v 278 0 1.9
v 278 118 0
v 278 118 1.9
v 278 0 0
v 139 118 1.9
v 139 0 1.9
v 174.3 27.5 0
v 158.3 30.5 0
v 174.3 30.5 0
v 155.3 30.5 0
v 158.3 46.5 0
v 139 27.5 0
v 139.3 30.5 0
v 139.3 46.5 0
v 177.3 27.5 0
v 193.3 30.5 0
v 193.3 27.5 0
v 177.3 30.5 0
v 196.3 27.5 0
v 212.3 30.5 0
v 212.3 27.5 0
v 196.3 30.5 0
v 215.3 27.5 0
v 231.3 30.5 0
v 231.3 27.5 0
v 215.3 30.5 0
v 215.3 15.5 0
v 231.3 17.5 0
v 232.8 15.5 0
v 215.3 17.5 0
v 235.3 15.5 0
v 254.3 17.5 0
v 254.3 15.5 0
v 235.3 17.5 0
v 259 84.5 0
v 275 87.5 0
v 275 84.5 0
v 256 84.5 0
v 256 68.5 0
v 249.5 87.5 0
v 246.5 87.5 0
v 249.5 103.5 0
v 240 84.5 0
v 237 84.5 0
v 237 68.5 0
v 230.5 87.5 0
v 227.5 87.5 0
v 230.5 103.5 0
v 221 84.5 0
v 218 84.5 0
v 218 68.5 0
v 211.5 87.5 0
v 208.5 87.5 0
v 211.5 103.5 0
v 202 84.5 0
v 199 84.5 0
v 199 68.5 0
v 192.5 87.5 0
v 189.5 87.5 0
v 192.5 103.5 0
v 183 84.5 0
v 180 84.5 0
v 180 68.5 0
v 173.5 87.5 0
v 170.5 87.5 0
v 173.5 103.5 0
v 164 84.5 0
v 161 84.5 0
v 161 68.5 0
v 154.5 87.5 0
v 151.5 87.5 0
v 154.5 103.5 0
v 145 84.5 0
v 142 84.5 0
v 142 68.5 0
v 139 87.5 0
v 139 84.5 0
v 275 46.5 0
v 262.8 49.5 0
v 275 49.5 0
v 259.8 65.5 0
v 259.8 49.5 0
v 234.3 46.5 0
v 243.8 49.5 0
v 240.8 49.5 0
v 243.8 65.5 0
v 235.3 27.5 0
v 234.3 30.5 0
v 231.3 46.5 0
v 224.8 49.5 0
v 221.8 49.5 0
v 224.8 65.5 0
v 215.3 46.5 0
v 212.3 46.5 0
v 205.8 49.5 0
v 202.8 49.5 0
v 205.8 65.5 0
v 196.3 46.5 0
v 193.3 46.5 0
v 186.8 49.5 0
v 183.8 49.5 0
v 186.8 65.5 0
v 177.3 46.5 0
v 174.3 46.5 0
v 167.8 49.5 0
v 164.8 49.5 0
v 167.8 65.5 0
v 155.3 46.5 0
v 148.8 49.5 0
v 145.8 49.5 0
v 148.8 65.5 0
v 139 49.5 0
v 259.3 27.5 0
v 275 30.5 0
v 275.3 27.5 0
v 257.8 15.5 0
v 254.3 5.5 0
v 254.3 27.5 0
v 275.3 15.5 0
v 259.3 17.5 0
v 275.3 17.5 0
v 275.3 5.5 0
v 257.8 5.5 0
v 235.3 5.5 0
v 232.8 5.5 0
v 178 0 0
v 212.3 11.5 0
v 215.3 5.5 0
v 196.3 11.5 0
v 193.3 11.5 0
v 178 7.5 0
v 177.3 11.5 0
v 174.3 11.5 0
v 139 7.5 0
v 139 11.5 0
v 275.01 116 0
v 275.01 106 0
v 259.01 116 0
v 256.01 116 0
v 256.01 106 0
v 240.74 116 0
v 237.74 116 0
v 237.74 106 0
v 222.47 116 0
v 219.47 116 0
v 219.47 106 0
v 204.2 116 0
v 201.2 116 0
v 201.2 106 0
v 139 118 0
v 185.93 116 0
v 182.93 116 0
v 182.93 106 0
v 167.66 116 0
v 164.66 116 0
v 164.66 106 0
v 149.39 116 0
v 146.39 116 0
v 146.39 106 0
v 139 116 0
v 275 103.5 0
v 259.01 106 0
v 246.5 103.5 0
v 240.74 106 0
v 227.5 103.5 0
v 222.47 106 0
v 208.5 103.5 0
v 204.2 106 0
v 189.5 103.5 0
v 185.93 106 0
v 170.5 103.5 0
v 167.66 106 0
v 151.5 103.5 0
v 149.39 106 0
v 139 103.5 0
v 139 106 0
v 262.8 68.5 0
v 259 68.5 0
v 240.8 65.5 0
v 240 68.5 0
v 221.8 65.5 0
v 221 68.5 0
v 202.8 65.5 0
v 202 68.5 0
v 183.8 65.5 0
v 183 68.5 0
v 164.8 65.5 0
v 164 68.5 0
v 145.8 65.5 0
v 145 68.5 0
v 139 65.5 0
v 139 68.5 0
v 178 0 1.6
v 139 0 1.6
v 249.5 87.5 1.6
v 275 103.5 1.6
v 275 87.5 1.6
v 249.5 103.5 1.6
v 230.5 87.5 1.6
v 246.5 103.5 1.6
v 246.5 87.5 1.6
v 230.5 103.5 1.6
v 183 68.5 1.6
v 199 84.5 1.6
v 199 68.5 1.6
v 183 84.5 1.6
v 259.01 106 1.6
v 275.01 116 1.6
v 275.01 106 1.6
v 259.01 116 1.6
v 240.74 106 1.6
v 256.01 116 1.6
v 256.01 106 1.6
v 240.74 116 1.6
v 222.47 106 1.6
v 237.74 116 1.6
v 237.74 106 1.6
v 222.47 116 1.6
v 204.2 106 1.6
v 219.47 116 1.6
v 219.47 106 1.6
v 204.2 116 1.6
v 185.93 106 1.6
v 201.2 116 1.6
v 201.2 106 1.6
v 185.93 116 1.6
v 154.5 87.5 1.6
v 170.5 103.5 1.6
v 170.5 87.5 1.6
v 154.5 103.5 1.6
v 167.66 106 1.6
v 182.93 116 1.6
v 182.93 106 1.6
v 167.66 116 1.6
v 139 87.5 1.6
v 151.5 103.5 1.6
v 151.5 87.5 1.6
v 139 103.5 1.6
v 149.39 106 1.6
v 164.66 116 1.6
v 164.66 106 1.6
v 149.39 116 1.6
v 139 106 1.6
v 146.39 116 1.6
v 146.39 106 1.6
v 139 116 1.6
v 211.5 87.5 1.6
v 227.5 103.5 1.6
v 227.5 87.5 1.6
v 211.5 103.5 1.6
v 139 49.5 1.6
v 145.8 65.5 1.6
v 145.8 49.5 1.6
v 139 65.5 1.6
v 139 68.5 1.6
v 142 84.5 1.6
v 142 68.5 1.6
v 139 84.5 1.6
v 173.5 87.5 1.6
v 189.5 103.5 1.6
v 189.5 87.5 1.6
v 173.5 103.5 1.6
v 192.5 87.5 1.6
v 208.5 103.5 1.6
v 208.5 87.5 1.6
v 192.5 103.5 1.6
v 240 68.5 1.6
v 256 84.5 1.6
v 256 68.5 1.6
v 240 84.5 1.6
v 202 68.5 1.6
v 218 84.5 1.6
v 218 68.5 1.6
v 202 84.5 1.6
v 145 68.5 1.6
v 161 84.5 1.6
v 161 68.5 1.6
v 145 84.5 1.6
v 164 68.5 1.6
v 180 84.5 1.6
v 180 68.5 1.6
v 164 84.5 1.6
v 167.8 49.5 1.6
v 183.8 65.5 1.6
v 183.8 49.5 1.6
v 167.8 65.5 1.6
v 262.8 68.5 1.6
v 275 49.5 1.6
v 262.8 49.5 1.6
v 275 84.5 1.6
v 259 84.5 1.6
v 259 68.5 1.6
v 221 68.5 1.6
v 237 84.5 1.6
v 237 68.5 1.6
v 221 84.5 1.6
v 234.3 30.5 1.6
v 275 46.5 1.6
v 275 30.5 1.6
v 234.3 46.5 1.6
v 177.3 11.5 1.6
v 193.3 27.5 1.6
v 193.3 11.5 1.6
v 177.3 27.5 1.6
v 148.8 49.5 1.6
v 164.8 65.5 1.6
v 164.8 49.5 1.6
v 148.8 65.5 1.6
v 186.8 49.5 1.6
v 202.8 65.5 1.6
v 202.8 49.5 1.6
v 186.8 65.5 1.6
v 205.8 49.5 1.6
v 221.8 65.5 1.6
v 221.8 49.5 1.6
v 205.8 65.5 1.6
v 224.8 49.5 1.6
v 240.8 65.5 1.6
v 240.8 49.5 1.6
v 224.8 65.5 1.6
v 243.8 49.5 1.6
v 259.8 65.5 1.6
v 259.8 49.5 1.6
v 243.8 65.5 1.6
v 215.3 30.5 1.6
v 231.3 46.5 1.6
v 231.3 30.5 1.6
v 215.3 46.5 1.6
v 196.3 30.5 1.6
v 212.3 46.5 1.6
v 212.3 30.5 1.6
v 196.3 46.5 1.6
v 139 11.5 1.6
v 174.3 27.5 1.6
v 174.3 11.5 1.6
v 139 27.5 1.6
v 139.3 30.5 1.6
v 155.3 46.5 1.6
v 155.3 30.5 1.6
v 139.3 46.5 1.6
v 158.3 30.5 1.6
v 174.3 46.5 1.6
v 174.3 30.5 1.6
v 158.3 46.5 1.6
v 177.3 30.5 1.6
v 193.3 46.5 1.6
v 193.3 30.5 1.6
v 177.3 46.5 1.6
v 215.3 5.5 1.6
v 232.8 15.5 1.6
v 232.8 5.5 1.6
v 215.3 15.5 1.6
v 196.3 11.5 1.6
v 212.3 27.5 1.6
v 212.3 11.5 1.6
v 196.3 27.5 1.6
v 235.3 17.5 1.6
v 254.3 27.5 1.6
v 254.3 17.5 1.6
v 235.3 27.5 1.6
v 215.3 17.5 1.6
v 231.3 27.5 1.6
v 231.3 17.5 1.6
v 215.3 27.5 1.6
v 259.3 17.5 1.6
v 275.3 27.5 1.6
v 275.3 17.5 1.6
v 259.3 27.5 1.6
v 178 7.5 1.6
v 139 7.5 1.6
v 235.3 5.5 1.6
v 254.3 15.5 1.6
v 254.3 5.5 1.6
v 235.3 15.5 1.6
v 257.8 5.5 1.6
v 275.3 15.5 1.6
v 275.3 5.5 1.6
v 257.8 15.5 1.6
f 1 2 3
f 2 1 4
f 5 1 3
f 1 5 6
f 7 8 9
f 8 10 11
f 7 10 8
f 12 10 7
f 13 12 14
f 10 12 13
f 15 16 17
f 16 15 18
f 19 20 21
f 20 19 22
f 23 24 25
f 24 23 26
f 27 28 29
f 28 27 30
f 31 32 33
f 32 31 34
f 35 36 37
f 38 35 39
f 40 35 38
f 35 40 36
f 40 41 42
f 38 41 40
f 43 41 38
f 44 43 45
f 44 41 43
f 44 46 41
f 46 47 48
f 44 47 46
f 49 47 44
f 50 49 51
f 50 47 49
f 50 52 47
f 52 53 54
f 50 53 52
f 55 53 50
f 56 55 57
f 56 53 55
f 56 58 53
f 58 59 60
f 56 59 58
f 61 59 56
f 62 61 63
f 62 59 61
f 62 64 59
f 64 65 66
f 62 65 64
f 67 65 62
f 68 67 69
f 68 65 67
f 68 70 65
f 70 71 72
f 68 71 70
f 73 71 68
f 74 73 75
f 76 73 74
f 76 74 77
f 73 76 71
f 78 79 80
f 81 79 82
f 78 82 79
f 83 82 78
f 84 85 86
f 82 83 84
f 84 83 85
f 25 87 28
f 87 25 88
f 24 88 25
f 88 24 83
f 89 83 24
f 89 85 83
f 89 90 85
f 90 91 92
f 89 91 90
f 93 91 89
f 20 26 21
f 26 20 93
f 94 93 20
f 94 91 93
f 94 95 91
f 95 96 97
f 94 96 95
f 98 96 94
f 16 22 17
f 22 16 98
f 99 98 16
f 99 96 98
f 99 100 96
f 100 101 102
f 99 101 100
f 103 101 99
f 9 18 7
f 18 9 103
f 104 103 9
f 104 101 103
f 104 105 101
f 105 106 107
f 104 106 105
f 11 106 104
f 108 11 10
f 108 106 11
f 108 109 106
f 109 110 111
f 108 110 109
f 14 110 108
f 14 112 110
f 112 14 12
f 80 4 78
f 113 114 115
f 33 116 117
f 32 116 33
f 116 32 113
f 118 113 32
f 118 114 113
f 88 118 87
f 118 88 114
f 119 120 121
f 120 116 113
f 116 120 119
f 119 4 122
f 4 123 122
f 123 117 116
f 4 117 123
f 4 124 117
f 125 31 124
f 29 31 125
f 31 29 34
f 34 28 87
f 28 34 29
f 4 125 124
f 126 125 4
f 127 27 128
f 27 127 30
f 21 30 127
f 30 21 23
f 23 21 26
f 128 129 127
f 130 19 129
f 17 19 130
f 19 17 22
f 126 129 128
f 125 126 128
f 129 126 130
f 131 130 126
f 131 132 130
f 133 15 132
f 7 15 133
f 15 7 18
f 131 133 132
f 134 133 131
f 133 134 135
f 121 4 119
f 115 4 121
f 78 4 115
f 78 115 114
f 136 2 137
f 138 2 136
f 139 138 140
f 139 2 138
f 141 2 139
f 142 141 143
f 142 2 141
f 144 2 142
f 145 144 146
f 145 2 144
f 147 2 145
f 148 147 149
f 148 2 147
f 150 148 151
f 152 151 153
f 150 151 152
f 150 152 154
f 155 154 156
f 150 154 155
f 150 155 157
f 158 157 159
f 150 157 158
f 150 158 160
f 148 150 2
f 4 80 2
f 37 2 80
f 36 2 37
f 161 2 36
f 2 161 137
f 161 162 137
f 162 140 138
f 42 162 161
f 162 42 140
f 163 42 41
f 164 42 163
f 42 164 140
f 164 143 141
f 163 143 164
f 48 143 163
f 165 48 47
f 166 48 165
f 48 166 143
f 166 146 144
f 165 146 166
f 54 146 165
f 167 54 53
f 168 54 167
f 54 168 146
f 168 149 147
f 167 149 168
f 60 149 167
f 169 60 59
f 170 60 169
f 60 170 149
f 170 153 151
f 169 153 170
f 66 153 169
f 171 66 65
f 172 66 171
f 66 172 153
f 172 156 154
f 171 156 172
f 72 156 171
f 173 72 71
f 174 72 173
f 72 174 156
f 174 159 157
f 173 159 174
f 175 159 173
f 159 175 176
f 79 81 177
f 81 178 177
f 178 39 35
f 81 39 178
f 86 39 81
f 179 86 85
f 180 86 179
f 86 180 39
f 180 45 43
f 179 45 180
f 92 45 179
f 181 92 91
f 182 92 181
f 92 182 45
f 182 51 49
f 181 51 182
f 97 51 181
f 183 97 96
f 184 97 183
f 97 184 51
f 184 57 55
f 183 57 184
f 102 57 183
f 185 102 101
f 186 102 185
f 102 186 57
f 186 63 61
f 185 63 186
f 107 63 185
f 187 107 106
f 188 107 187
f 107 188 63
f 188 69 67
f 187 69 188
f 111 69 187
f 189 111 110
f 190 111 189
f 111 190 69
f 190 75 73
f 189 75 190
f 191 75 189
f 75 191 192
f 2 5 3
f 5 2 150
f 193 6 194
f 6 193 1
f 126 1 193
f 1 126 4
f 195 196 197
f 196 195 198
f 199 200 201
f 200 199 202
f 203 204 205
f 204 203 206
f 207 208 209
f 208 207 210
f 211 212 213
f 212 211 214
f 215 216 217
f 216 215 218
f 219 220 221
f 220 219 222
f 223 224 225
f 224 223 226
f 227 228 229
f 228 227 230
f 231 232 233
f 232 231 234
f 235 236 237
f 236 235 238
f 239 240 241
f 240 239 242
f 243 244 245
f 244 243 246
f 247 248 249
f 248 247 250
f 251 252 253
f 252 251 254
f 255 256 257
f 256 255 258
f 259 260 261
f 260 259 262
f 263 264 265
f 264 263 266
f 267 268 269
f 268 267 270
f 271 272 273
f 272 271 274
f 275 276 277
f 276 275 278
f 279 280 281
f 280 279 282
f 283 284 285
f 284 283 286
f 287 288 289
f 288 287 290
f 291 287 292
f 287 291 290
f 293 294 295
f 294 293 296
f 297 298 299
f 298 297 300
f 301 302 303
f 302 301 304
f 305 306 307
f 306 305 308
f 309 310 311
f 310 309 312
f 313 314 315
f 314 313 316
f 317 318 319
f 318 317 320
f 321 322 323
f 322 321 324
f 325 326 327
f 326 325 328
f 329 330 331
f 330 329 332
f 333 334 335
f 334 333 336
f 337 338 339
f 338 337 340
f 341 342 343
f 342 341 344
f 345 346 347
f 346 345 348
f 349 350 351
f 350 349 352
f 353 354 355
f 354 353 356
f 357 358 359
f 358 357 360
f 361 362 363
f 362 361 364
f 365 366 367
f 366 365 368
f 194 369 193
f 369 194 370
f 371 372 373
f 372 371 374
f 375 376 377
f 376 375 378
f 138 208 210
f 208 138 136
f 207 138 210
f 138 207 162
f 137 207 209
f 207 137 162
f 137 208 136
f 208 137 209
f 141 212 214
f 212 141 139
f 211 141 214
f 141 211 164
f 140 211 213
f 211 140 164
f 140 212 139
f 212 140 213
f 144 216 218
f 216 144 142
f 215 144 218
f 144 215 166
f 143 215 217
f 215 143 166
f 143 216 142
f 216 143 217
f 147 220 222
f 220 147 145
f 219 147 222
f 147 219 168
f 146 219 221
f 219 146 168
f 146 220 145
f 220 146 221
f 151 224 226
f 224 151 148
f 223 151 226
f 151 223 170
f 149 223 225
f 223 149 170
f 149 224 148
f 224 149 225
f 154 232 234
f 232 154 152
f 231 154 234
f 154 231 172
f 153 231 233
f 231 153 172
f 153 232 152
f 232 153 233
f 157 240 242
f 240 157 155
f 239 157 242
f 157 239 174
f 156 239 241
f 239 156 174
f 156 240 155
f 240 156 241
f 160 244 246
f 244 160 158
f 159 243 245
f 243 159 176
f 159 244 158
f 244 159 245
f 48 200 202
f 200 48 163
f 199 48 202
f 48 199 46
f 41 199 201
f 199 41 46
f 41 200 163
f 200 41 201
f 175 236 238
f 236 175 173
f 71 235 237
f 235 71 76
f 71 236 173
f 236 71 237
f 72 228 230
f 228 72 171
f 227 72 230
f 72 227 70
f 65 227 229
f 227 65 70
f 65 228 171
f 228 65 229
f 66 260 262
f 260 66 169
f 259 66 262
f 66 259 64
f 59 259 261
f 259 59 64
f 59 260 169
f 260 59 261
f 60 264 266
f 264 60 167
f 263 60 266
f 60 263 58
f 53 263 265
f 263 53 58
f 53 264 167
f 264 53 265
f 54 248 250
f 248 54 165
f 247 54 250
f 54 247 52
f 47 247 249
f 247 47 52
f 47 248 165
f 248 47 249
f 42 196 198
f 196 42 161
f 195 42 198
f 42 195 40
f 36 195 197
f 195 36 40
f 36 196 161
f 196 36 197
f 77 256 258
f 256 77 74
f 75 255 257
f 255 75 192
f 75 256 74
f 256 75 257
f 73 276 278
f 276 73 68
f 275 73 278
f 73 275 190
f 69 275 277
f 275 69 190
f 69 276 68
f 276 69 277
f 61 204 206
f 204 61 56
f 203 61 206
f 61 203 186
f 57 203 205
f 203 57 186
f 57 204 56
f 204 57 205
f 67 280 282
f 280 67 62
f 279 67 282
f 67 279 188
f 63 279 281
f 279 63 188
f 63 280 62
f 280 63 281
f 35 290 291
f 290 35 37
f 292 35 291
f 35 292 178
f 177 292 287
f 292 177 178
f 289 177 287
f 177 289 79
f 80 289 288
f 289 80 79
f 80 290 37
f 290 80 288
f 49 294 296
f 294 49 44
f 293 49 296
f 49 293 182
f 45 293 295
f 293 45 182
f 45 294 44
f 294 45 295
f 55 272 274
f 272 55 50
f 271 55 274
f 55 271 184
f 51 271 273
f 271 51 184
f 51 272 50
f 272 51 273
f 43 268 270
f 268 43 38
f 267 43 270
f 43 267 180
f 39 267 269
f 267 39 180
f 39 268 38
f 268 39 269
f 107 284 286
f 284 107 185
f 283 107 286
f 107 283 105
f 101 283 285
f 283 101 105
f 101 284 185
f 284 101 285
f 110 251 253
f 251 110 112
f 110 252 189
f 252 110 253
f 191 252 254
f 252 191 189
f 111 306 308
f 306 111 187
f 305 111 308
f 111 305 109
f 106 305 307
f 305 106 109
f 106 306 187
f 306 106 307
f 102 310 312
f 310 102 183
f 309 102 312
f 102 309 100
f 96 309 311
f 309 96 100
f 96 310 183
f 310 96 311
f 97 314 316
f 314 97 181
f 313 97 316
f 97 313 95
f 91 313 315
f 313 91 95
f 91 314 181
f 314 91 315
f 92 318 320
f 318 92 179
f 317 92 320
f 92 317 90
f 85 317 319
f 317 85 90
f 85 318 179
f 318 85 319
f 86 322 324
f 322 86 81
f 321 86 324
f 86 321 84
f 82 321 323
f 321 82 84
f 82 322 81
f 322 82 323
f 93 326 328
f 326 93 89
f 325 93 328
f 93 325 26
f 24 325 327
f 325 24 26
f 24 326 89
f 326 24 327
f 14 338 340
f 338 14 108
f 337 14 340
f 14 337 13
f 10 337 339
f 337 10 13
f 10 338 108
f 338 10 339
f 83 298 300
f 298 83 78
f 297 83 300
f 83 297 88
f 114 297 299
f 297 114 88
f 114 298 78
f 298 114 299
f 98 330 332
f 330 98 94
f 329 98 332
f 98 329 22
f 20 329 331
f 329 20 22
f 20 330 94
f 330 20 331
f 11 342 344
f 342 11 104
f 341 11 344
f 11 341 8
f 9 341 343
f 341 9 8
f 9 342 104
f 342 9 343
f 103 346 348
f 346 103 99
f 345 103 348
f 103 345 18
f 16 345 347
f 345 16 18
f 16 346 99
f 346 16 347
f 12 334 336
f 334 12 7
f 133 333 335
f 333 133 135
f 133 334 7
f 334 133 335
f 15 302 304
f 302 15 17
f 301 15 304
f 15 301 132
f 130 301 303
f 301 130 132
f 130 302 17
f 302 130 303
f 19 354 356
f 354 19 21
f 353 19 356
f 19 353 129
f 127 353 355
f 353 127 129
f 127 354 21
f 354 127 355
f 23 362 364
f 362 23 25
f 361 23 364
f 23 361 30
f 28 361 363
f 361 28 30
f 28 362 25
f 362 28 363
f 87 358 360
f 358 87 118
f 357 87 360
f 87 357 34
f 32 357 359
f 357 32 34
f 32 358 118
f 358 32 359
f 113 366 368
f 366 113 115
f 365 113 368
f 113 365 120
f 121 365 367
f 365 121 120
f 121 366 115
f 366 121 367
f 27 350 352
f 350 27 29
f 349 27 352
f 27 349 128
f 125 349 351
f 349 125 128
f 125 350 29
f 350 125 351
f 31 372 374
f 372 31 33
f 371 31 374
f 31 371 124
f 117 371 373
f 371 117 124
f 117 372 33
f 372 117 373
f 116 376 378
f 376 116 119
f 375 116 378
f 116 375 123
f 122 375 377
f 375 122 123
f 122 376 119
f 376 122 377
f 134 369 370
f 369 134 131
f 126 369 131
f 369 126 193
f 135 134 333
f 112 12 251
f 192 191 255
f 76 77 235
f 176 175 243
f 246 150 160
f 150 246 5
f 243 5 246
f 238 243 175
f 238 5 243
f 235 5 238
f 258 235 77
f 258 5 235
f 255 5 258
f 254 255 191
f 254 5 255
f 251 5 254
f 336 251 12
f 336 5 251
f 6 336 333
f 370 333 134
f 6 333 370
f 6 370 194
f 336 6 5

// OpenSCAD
$fn = 50;

// total size
width = 278;
height = 118;

// regular rows
xPitch = 19;
yPitch = 19;
keyW = 16;
keyH = 16;
standardXMargin = (xPitch - keyW)/2;
standardYMargin = (yPitch - keyH)/2;

// F-keys and D-pad
smallKeyH = 10;
smallYPitch = 12;
smallYMargin = (smallYPitch - smallKeyH)/2;

module key(keyW = keyW, keyH = keyH, xMargin = standardXMargin, yMargin = standardYMargin) {
    translate([xMargin, yMargin]) square([keyW, keyH]);
}

module rowFragment(n=1, xPitch = xPitch, yPitch = yPitch, xMargin = standardXMargin, yMargin = standardYMargin) {
    keyW = xPitch - 2 * xMargin;
    keyH = yPitch - 2 * yMargin;

    for (i = [0:n-1]) {
        translate([i * xPitch, 0]) key(keyW = keyW, keyH = keyH,xMargin = xMargin, yMargin = yMargin);
    }
    translate([n * xPitch, 0]) children();
}

module rows(yPitch = yPitch) {
    for ( i= [0:1:$children-1]) {
        translate([0, ($children-i-1) * yPitch]) children(i);
    }
}

module layout() {
    translate([0, yPitch * 5]) rowFragment(yPitch = smallYPitch, yMargin = smallYMargin) rowFragment(n=13, xPitch = 18.27, yPitch = smallYPitch, yMargin = smallYMargin) rowFragment(yPitch = smallYPitch, yMargin = smallYMargin);  // Esc, F-keys, ... / R6
    rows() {
        rowFragment(n=13) rowFragment(xPitch = 1.5 * xPitch); // number row / R5
        rowFragment(xPitch = 1.5 * xPitch) rowFragment(n=13); // alpha 1 / R4
        rowFragment(xPitch = 1.7 * xPitch) rowFragment(n=12) key(keyW = 0.8 * xPitch - 2 * standardXMargin, keyH = keyH + yPitch); // alpha 2 / R3 (with ISO enter)
        rowFragment(xPitch = 1.2 * xPitch) rowFragment(n=11) rowFragment(xPitch = 2.3 * xPitch); // alpha 3 / R2
        rowFragment(xPitch = 1.2 * xPitch) rowFragment(n=3) rowFragment(xPitch = 5 * xPitch) rowFragment(n=2); // mods and space / R1
    }
    // arrow pad
    translate([xPitch * 11.2 + standardXMargin, yPitch - standardYMargin - smallKeyH -smallYPitch]) {
        translate([0, smallYPitch]) square([16,smallKeyH]); translate([20,smallYPitch]) square([19,smallKeyH]); translate([44,smallYPitch]) square([16,smallKeyH]);
        square([17.5,smallKeyH]); translate([20,0]) square([19,smallKeyH]); translate([42.5, 0]) square([17.5,smallKeyH]);
    }
    // mouse buttons
    translate([78, -25 - 4+standardYMargin]) square([99, 25]);
    // trackstick
    translate([xPitch * 6.7, yPitch * 2 + (yPitch-keyH)/2]) circle(r=4.5);
 }

module cover() {
    difference() {
        cube([width, height, 1.9]);
        linear_extrude(height = 1.6) translate([1, 10]) layout();
    }
}

intersection() {
    cover();
//    cube([width/2,height,50]); // uncomment to print left half
    translate([width/2,0,0]) cube([width/2,height,50]); // uncomment to print right half
}
